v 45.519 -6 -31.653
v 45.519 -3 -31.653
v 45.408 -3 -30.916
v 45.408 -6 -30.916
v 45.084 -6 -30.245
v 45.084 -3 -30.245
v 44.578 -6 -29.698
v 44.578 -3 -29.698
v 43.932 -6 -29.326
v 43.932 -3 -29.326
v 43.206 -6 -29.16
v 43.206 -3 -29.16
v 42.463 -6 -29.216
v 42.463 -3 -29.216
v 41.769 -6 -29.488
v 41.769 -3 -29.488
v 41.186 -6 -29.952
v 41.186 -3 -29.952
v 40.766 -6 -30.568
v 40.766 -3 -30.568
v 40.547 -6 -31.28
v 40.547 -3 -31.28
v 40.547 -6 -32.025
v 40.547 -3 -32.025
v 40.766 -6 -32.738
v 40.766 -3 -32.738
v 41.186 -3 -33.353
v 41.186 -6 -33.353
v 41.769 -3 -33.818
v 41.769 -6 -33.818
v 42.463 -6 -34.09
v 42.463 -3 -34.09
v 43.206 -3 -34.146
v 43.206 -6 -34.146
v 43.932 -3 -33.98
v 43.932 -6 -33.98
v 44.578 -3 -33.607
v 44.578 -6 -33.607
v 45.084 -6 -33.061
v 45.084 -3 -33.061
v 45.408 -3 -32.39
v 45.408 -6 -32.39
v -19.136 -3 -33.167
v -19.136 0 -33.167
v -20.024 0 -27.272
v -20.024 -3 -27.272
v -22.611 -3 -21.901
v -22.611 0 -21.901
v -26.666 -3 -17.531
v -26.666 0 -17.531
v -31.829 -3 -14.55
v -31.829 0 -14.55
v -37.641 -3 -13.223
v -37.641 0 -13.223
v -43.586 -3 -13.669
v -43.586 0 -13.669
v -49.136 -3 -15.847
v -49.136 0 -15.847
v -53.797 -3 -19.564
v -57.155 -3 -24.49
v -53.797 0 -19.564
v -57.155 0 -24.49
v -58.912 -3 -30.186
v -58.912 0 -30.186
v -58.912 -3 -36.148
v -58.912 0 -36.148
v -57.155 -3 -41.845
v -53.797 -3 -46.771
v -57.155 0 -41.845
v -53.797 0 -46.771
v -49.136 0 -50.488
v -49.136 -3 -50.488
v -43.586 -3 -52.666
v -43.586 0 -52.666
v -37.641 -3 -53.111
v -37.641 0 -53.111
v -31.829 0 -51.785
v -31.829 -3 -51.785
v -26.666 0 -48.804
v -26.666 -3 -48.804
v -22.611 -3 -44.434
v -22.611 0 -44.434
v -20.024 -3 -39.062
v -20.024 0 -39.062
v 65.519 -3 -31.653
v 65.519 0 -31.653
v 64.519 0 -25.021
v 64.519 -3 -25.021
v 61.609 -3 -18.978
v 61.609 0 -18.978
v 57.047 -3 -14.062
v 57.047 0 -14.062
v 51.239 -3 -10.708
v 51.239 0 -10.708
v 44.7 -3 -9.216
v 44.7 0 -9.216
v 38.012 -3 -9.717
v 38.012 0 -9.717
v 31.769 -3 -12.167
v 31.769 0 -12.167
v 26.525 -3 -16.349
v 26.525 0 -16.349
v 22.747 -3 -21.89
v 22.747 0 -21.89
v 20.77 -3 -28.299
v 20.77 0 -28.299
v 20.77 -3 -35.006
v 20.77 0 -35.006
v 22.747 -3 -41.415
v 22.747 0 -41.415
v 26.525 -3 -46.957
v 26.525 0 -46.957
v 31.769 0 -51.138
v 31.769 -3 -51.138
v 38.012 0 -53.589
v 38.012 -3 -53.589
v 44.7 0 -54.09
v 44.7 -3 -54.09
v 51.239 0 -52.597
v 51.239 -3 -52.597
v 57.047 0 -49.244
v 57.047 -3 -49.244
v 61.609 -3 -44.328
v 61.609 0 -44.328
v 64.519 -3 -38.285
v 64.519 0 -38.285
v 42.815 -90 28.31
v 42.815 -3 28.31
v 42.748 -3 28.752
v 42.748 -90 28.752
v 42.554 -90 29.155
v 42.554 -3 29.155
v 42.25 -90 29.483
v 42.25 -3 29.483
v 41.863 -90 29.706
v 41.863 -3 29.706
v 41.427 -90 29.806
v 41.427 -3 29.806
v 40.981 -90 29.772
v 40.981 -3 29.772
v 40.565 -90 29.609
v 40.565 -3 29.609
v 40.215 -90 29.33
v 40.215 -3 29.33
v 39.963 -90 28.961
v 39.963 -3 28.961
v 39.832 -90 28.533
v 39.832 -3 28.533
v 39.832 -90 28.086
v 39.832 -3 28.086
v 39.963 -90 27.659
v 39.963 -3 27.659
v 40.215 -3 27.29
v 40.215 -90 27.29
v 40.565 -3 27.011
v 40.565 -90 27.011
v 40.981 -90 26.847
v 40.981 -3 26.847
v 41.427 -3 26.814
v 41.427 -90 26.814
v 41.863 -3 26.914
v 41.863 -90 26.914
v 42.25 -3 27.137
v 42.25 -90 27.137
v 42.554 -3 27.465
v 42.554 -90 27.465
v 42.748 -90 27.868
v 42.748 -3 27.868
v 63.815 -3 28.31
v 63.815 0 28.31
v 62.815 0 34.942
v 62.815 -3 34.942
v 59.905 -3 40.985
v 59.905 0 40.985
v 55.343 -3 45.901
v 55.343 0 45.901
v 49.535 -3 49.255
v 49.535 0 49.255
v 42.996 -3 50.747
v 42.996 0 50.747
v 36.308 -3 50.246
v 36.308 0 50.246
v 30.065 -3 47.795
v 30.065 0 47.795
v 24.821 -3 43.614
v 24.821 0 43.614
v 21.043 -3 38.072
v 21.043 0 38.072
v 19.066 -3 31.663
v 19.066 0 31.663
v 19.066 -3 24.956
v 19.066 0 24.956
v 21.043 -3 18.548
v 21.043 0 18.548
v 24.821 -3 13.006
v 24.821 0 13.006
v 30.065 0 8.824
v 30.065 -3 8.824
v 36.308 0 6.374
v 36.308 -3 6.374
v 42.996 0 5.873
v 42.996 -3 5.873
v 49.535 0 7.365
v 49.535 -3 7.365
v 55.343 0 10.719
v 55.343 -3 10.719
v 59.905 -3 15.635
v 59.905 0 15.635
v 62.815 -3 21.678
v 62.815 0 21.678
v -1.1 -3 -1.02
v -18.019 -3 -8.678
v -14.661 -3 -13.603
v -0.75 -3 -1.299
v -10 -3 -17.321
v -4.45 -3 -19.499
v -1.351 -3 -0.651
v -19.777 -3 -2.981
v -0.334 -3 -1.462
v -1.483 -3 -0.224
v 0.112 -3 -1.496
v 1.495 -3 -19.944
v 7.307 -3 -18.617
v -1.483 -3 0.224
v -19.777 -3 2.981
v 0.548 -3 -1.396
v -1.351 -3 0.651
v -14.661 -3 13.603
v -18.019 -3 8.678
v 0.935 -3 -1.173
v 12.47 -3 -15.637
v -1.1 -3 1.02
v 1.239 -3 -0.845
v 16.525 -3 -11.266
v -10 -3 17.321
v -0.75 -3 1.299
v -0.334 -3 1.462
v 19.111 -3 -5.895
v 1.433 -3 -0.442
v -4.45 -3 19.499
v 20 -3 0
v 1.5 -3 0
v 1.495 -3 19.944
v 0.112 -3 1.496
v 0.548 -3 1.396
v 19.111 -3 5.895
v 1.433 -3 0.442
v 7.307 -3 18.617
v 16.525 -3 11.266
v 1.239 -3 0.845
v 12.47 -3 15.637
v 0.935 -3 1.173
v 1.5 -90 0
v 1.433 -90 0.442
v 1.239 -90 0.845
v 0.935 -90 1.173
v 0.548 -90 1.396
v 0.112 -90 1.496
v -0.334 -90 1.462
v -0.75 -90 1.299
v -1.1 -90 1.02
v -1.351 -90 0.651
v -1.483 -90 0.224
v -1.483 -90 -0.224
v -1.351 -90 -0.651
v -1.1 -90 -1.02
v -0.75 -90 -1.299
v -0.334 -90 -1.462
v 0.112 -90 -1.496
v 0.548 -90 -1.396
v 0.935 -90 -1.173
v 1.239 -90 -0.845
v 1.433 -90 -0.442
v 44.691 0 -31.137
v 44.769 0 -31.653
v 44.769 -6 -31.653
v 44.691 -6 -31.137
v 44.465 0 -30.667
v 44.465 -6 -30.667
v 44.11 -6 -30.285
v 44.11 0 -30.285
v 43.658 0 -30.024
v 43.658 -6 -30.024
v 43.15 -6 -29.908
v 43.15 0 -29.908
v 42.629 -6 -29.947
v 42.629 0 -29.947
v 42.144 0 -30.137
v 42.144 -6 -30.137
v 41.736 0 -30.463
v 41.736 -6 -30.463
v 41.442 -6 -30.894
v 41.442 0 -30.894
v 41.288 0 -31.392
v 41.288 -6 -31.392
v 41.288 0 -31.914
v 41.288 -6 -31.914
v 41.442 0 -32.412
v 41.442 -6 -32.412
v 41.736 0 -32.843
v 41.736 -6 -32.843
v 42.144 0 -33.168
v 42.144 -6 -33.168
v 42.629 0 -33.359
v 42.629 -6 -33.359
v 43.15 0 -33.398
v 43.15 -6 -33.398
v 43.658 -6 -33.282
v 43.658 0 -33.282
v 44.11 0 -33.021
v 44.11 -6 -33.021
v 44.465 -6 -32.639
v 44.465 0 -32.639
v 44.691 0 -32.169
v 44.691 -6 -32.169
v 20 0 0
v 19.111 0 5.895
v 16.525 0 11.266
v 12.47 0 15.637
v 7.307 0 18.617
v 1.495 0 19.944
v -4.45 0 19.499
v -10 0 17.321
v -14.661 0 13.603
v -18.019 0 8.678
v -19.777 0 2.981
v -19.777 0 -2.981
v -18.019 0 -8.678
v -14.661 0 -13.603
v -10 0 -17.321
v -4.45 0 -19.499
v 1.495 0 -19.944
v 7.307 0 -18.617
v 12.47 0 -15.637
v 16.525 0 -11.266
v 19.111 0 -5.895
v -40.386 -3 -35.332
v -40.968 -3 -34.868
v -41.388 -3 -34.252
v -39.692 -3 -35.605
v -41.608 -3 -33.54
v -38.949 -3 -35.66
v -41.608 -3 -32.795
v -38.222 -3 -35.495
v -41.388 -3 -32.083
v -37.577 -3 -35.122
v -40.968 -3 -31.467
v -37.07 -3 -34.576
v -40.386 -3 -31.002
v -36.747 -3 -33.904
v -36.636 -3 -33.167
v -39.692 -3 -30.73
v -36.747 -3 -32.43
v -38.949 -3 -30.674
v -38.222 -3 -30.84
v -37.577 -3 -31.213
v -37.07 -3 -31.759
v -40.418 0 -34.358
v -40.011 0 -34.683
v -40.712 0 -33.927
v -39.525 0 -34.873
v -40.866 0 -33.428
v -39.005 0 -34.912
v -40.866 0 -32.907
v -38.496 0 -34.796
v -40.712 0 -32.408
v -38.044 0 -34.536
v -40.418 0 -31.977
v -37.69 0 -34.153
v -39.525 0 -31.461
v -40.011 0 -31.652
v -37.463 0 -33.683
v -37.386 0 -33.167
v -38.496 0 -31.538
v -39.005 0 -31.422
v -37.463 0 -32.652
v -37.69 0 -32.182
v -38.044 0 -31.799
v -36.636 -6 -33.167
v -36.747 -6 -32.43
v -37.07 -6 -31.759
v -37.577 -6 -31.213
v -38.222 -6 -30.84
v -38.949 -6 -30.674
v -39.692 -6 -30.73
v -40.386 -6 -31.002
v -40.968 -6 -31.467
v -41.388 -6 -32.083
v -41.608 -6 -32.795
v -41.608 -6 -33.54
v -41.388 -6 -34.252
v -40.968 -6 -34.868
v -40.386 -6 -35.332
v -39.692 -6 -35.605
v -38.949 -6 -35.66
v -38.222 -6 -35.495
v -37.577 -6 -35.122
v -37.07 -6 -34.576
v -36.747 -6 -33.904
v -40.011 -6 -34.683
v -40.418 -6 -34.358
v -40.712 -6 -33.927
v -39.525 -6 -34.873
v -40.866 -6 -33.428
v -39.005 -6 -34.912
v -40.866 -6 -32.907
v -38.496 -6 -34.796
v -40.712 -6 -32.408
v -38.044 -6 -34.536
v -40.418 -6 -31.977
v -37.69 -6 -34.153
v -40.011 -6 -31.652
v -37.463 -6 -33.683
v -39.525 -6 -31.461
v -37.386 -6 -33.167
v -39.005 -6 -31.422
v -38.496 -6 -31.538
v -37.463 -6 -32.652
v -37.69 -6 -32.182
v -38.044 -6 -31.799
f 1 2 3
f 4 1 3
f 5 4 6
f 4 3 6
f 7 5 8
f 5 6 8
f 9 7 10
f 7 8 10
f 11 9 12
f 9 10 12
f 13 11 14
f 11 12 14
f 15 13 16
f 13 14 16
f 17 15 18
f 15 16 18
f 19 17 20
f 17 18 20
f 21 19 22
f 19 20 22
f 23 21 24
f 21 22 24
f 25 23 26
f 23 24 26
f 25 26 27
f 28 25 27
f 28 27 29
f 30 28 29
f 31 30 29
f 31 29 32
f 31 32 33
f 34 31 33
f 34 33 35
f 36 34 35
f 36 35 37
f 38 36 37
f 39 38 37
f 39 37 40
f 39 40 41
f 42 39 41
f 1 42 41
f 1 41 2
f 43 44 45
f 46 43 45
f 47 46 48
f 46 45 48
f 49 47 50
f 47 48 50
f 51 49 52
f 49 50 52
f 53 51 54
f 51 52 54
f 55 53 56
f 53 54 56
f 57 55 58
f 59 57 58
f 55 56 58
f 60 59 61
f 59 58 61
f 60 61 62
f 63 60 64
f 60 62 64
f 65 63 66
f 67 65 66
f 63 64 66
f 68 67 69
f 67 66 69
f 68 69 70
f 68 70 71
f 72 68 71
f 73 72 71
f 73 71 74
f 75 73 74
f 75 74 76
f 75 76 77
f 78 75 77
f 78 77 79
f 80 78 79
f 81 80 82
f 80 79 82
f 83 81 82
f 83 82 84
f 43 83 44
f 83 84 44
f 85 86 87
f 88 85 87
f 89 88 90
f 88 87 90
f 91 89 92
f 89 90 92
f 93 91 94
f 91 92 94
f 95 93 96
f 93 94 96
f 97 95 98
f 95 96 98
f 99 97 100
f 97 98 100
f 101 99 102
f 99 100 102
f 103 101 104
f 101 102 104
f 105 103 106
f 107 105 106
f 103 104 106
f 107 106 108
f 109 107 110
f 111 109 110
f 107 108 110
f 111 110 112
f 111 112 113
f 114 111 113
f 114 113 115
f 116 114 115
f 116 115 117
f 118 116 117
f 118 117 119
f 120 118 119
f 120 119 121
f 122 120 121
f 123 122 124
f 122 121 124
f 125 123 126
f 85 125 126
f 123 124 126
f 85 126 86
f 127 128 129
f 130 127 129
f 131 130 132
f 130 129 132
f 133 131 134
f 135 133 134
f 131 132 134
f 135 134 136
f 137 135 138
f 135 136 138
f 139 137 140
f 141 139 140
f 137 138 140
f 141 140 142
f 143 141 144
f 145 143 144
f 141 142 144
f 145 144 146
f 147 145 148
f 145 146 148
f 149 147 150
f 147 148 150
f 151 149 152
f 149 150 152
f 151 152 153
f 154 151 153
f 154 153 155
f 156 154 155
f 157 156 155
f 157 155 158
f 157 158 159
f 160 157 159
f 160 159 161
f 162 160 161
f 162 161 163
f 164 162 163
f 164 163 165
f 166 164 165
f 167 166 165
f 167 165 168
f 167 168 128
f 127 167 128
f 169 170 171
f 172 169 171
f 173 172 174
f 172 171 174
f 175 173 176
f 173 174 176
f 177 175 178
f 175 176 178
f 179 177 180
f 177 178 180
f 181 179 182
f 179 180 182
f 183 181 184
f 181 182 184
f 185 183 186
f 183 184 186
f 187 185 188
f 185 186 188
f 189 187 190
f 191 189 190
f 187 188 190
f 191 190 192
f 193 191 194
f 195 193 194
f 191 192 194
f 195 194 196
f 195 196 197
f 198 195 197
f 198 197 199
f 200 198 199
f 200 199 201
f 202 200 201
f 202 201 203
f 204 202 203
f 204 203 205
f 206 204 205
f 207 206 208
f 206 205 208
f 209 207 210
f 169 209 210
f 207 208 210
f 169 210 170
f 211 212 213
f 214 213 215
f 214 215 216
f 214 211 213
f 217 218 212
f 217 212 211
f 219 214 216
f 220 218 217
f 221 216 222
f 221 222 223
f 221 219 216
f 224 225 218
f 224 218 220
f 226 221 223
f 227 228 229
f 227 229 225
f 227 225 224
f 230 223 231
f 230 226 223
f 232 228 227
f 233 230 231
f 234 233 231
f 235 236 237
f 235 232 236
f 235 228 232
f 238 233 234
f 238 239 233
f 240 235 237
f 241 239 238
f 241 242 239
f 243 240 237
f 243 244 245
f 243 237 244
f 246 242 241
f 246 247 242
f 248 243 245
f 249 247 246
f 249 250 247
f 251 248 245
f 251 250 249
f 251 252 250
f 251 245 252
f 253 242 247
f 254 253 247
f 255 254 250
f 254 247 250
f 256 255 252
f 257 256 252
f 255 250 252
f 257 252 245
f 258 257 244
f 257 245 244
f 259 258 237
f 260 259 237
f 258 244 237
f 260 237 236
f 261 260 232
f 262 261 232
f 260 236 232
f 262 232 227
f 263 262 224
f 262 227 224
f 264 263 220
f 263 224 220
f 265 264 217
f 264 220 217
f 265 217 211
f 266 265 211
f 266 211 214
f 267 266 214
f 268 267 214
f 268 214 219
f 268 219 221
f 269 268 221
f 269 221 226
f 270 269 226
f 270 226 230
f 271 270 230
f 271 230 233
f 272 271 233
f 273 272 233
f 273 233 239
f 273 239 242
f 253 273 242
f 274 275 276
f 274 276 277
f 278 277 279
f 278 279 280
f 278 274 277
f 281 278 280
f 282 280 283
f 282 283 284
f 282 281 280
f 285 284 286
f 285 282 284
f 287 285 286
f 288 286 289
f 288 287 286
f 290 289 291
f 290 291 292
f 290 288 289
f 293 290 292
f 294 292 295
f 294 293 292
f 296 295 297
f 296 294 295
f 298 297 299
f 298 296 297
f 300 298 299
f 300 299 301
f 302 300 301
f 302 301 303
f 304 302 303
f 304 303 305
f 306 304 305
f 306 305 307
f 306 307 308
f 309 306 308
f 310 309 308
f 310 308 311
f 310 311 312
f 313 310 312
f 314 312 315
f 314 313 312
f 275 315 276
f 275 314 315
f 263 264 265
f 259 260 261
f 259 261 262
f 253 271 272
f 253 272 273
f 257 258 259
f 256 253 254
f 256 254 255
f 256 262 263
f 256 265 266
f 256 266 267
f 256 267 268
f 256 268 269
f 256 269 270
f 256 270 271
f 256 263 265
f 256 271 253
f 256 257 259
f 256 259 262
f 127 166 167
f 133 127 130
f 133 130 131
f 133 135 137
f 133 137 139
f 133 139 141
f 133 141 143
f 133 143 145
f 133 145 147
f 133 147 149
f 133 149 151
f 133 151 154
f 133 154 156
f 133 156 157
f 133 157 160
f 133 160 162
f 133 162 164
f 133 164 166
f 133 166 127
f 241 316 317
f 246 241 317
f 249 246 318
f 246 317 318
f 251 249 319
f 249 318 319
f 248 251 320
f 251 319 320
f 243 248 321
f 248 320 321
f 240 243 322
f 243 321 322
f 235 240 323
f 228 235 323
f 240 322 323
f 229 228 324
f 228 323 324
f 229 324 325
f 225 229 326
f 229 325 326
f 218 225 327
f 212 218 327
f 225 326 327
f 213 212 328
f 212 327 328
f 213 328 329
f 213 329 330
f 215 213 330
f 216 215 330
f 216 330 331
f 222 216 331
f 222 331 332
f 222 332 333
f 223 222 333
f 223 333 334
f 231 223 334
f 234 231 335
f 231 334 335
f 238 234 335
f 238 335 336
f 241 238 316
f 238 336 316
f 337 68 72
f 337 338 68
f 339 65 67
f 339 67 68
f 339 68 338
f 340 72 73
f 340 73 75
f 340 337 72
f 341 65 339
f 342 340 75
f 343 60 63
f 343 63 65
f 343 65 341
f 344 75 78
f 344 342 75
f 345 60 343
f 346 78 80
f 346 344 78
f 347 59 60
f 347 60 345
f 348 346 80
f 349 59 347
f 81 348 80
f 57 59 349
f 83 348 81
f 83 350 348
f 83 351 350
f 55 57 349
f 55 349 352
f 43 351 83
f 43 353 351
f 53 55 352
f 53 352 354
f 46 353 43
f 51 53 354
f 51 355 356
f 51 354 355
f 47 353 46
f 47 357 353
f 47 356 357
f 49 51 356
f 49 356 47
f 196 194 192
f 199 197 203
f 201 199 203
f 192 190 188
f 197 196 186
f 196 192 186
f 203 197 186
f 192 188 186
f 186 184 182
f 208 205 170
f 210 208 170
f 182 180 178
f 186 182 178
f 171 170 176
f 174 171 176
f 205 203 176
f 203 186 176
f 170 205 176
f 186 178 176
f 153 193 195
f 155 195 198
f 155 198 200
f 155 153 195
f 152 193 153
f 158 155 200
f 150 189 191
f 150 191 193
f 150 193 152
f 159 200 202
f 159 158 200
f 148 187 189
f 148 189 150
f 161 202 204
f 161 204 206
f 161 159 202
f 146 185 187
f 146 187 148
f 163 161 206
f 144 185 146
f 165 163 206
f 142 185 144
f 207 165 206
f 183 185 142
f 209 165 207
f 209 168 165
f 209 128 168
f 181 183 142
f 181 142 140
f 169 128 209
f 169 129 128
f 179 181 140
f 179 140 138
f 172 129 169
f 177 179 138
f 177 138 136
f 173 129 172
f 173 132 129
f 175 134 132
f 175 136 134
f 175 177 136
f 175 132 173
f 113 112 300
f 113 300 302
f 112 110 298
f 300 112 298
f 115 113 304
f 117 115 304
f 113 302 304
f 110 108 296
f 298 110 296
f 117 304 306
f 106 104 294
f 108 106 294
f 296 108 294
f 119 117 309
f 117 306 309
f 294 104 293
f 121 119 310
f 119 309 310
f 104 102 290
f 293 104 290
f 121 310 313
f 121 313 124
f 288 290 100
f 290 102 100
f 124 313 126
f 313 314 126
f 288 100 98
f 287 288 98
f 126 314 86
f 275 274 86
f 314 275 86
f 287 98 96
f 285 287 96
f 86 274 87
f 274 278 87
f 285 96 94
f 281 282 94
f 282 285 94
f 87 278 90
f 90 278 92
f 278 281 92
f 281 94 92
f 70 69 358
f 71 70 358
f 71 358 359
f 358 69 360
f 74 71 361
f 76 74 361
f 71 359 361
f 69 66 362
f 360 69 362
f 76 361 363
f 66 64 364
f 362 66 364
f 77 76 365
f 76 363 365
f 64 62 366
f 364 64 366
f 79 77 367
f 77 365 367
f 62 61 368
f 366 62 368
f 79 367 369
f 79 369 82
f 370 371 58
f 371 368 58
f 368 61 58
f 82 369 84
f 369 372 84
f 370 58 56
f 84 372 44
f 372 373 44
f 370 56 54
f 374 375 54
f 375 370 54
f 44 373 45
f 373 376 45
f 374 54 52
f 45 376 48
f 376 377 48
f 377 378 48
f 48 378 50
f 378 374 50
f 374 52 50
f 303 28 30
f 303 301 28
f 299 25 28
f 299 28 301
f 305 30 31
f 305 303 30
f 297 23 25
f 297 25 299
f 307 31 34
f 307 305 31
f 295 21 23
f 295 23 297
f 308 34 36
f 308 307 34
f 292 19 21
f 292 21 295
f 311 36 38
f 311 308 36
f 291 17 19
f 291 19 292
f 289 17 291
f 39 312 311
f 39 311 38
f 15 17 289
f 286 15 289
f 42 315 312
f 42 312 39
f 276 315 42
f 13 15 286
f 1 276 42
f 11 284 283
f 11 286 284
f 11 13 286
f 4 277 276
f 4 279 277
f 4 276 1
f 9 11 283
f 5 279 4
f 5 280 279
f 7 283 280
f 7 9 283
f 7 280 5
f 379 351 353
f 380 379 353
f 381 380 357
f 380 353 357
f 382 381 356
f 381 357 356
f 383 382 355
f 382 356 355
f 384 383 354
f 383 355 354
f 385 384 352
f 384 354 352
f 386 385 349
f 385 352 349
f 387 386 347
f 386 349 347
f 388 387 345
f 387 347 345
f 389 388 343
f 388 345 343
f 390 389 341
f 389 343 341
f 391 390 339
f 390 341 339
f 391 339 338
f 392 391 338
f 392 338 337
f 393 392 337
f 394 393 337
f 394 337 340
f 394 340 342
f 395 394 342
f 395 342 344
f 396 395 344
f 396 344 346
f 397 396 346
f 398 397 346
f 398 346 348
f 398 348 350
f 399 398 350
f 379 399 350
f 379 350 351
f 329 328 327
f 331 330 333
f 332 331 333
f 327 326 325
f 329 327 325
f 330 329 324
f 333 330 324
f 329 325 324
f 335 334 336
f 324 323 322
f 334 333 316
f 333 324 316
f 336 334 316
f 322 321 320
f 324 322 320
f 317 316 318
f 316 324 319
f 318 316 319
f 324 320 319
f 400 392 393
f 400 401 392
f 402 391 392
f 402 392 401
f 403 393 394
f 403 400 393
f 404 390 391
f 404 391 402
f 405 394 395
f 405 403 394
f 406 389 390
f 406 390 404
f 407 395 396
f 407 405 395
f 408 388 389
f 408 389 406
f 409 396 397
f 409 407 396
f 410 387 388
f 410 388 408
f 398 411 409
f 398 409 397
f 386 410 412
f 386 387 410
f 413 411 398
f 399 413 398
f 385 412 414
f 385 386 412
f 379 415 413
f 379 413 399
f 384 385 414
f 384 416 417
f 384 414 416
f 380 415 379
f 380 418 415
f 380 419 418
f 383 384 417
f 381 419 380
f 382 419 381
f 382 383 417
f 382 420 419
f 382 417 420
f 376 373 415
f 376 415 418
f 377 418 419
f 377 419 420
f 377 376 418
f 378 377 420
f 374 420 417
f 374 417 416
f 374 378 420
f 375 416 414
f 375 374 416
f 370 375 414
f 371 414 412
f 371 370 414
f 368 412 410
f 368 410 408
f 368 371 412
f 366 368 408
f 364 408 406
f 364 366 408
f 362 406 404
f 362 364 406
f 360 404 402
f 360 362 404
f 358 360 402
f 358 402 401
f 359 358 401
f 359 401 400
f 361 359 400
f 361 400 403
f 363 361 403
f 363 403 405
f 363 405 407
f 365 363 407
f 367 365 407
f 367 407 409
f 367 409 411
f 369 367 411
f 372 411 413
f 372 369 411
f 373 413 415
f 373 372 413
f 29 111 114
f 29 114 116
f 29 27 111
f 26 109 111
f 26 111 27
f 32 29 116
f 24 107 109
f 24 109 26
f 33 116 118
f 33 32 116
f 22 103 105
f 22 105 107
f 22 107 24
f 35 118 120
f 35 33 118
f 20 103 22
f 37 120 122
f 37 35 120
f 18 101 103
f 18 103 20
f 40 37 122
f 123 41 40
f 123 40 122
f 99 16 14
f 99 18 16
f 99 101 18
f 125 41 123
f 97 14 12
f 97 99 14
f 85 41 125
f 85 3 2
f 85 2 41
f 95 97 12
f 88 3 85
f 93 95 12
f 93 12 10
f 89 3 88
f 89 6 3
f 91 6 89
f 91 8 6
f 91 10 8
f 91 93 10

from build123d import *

# Parameters (mm, degrees)
F0_R     = 20
F0_R_2   = 1.5
F1_DEPTH = 3
F0_R_3   = 2.5
F0_R_4   = 22.5
F2_DEPTH = 90
F0_R_5   = 1.75
F3_DEPTH = 6
F4_DEPTH = 90


# Not quite as in the source:
# - a feature names something its author has since deleted; it is built from what else it names


with BuildPart() as f1:
    # F0 (on Front) → F1 (new body)
    with BuildSketch(Plane.XZ):
        Circle(F0_R)
        Circle(F0_R_2, mode=Mode.SUBTRACT)
    extrude(amount=F1_DEPTH)

    # F0 (on Front) → F2 (join)
    with BuildSketch(Plane.XZ):
        Circle(F0_R_2)
    extrude(amount=F2_DEPTH)


with BuildPart() as f1b:
    # F0 (on Front) → F1, piece 2 (new body)
    with BuildSketch(Plane.XZ):
        with Locations((-39.1355007887, -33.1673398614)):
            Circle(F0_R)
        with Locations((-39.1355007887, -33.1673398614)):
            Circle(F0_R_3, mode=Mode.SUBTRACT)
    extrude(amount=F1_DEPTH)

    # F0 (on Front) → F3 (join)
    with BuildSketch(Plane.XZ):
        with Locations((-39.1355007887, -33.1673398614)):
            Circle(F0_R_3)
        with Locations((-39.1355007887, -33.1673398614)):
            Circle(F0_R_5, mode=Mode.SUBTRACT)
    extrude(amount=F3_DEPTH)


with BuildPart() as f1c:
    # F0 (on Front) → F1, piece 3 (new body)
    with BuildSketch(Plane.XZ):
        with Locations((43.018873781, -31.6528305411)):
            Circle(F0_R_4)
        with Locations((43.018873781, -31.6528305411)):
            Circle(F0_R_3, mode=Mode.SUBTRACT)
    extrude(amount=F1_DEPTH)

    # F0 (on Front) → F3, piece 2 (join)
    with BuildSketch(Plane.XZ):
        with Locations((43.018873781, -31.6528305411)):
            Circle(F0_R_3)
        with Locations((43.018873781, -31.6528305411)):
            Circle(F0_R_5, mode=Mode.SUBTRACT)
    extrude(amount=F3_DEPTH)


with BuildPart() as f1d:
    # F0 (on Front) → F1, piece 4 (new body)
    with BuildSketch(Plane.XZ):
        with Locations((41.3147807121, 28.3098872751)):
            Circle(F0_R_4)
        with Locations((41.3147807121, 28.3098872751)):
            Circle(F0_R_2, mode=Mode.SUBTRACT)
    extrude(amount=F1_DEPTH)

    # F0 (on Front) → F4 (join)
    with BuildSketch(Plane.XZ):
        with Locations((41.3147807121, 28.3098872751)):
            Circle(F0_R_2)
    extrude(amount=F4_DEPTH)


solid = Compound([f1.part, f1b.part, f1c.part, f1d.part])
